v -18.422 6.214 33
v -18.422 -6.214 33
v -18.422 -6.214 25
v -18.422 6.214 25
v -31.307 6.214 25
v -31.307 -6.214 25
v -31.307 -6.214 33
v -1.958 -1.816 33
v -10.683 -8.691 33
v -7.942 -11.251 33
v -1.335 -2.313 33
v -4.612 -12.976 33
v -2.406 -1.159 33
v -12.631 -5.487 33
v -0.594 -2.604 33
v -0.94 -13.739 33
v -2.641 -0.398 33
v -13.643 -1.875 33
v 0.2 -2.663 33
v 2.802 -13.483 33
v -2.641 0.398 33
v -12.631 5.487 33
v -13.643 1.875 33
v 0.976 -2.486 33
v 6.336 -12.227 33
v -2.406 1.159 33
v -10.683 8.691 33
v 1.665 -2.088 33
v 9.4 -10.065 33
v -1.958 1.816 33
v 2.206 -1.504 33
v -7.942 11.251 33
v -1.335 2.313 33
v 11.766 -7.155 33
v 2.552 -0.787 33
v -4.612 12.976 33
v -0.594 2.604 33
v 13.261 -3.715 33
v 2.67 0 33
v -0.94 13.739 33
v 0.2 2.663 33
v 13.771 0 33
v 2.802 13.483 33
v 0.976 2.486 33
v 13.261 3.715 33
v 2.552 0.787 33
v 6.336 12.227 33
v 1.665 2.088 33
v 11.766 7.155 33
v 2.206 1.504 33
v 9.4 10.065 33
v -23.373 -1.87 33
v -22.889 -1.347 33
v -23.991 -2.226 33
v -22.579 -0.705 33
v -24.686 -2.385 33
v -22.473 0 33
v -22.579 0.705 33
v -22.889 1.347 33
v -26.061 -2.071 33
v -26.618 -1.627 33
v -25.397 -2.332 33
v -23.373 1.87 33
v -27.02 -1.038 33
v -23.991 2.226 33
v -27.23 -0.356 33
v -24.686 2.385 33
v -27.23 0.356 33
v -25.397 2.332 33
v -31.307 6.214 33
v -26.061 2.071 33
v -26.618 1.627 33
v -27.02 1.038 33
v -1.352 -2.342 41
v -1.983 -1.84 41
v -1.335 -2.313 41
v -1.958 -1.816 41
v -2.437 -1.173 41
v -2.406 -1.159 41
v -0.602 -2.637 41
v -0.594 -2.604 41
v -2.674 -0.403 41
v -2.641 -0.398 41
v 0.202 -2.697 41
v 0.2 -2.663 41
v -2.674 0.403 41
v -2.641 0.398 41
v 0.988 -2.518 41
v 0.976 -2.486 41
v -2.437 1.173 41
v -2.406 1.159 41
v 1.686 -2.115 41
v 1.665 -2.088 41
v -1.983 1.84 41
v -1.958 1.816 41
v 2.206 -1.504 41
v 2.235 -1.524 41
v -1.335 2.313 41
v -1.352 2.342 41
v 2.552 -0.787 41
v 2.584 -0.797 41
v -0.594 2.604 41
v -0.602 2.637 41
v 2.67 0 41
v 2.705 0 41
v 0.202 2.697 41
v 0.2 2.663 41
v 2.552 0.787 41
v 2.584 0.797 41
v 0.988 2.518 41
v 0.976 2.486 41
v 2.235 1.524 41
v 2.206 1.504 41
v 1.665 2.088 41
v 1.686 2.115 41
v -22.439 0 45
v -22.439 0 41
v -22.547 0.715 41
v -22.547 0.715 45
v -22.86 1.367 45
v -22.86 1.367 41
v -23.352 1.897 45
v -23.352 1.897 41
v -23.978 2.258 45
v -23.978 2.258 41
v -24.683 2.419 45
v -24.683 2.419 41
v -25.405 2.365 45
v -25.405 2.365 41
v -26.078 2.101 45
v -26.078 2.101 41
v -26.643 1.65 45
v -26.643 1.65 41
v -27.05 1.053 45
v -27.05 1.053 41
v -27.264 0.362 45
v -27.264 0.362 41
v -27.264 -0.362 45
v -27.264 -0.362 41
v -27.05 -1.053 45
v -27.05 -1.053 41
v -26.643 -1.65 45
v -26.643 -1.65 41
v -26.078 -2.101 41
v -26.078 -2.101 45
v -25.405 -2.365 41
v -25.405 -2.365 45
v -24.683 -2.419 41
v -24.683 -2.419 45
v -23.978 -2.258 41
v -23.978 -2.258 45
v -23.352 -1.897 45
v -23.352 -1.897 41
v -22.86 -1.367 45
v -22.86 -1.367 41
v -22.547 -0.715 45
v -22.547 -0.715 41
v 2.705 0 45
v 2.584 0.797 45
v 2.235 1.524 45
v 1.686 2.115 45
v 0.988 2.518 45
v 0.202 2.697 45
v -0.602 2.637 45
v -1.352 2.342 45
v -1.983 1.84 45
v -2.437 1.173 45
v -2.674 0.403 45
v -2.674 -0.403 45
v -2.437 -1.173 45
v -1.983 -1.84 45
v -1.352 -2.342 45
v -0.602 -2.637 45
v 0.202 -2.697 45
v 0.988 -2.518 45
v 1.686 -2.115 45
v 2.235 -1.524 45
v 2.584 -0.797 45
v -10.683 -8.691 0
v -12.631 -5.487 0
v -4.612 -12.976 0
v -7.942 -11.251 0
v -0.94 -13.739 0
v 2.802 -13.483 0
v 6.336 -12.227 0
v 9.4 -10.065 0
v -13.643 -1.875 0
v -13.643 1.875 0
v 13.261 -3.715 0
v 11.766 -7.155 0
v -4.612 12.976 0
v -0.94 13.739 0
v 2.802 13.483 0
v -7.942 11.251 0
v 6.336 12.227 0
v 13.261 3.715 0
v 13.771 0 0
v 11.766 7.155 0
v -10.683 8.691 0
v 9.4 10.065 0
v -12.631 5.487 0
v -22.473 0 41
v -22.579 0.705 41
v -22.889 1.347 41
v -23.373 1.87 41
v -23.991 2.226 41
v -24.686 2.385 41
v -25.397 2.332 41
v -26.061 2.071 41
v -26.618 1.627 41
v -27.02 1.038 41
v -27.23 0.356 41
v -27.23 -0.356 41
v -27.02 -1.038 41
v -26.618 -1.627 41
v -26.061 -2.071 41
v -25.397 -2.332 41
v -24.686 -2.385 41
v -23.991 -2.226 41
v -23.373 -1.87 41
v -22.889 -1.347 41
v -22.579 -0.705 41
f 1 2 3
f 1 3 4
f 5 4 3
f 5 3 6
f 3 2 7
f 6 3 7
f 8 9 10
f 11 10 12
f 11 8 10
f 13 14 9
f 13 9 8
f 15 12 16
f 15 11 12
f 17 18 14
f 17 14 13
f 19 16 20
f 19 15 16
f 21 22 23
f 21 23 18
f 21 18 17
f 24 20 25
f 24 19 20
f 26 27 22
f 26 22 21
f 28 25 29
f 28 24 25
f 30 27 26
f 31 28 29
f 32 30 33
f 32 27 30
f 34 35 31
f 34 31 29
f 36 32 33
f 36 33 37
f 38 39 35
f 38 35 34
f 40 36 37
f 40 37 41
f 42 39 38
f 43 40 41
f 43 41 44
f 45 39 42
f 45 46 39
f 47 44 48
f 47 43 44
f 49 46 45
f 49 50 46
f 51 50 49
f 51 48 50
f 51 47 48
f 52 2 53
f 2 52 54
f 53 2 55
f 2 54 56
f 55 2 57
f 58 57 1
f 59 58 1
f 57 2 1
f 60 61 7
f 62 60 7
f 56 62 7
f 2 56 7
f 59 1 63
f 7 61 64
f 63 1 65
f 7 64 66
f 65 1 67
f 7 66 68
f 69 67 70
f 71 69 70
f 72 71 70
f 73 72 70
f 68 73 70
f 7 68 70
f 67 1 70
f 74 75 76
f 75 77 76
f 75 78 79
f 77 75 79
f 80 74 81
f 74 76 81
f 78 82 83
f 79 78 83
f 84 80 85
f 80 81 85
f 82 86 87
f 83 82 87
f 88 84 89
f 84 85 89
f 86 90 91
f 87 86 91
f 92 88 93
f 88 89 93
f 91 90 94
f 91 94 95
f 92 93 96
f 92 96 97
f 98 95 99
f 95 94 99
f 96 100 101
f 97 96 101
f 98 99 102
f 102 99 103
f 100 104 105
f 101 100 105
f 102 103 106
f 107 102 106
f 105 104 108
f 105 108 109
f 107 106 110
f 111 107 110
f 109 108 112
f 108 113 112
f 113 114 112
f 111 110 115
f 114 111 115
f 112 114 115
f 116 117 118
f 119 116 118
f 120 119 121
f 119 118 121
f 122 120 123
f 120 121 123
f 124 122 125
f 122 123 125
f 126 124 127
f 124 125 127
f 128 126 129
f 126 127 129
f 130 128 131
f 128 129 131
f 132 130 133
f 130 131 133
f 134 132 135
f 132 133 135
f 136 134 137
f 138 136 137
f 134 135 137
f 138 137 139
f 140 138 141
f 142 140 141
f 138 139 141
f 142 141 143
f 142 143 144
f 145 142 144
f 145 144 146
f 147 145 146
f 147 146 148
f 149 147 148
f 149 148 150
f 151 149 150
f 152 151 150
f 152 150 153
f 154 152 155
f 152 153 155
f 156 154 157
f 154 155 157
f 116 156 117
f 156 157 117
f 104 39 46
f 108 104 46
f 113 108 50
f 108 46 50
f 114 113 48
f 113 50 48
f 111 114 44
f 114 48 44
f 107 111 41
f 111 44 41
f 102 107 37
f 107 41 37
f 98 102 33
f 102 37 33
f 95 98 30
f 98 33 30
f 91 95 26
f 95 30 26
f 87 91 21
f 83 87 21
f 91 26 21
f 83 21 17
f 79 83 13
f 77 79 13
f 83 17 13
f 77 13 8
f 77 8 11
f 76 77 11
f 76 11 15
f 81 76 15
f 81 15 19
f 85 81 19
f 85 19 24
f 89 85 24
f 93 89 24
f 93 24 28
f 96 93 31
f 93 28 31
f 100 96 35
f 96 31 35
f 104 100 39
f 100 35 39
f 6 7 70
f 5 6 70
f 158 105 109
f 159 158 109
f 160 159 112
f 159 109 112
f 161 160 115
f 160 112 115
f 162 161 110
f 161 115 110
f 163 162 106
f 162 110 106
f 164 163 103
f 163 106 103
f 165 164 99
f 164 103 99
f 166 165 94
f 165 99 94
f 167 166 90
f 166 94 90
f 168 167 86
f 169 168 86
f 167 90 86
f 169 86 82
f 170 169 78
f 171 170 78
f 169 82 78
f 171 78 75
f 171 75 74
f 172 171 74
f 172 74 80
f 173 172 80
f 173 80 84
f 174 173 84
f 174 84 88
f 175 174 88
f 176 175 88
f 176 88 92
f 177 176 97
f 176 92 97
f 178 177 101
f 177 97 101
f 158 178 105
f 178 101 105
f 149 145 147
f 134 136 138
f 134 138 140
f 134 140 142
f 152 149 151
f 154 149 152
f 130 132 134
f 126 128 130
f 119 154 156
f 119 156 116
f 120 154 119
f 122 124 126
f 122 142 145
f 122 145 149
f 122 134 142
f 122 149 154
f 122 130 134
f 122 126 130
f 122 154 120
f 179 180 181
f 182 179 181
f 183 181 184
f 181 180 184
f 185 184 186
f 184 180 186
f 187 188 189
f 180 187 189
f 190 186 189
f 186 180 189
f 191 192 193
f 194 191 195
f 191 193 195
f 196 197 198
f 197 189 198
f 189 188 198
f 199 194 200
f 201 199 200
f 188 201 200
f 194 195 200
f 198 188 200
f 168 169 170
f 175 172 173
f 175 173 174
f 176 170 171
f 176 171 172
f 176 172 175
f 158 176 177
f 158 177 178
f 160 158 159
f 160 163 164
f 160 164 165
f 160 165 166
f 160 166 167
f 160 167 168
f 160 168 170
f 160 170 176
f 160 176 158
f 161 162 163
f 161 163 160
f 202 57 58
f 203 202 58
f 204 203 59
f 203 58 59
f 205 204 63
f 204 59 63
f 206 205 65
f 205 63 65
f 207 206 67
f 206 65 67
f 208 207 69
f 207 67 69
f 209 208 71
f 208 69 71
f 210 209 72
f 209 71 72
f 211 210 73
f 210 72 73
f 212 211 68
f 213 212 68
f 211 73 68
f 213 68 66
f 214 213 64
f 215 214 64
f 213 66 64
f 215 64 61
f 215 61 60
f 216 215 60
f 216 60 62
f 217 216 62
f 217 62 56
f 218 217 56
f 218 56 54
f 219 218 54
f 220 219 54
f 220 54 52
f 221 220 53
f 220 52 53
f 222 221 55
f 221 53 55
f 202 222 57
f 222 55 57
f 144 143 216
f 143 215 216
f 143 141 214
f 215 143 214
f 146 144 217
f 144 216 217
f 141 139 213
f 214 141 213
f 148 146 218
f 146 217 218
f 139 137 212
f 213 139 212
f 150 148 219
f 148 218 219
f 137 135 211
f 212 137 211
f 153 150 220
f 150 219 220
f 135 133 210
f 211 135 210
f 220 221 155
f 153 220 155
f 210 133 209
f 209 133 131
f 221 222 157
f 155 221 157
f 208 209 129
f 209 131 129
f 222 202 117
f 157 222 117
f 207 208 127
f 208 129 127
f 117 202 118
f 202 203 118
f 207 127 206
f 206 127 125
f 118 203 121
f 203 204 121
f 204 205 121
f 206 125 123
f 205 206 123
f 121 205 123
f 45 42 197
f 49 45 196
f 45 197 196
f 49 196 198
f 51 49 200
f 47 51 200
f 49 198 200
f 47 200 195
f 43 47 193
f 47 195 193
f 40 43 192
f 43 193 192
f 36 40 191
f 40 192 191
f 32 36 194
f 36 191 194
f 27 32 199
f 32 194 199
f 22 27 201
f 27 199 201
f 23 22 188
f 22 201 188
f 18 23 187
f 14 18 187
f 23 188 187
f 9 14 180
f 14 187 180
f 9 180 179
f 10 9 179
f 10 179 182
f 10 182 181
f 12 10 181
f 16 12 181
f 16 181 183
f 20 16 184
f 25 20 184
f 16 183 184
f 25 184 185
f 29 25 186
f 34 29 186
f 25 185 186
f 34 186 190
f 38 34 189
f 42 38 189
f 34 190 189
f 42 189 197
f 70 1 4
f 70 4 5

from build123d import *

# Parameters (mm, degrees)
SKETCH2_R           = 13.771311666
BOSS_EXTRUDE1_DEPTH = 33
SKETCH4_R           = 2.670460619
BOSS_EXTRUDE2_DEPTH = 8
SKETCH5_R           = 2.391755936
BOSS_EXTRUDE3_DEPTH = 8
SKETCH6_W           = 12.884717539
SKETCH6_H           = 12.427625198
BOSS_EXTRUDE4_DEPTH = 8
SKETCH23_R          = 2.425954538
BOSS_EXTRUDE6_DEPTH = 4
SKETCH24_R          = 2.7046062
BOSS_EXTRUDE7_DEPTH = 4


with BuildPart() as part:
    # Sketch2 → Boss-Extrude1 (new body)
    with BuildSketch(Plane.XY):
        Circle(SKETCH2_R)
    extrude(amount=BOSS_EXTRUDE1_DEPTH)

    # Sketch4 → Boss-Extrude2 (add)
    with BuildSketch(Plane.XY.offset(33)):
        Circle(SKETCH4_R)
    extrude(amount=BOSS_EXTRUDE2_DEPTH)

    # Sketch24 → Boss-Extrude7 (add)
    with BuildSketch(Plane.XY.offset(41)):
        Circle(SKETCH24_R)
    extrude(amount=BOSS_EXTRUDE7_DEPTH)


with BuildPart() as body_2:
    # Sketch5 → Boss-Extrude3 (new body)
    with BuildSketch(Plane.XY.offset(33)):
        with Locations((-24.864724485, 0)):
            Circle(SKETCH5_R)
    extrude(amount=BOSS_EXTRUDE3_DEPTH)

    # Sketch6 → Boss-Extrude4 (add)
    with BuildSketch(Plane(origin=(0, 0, 33), x_dir=(-1, 0, 0), z_dir=(0, 0, -1))):
        with Locations((24.864724486, 0)):
            Rectangle(SKETCH6_W, SKETCH6_H)
    extrude(amount=BOSS_EXTRUDE4_DEPTH)

    # Sketch23 → Boss-Extrude6 (add)
    with BuildSketch(Plane.XY.offset(41)):
        with Locations((-24.864724485, 0)):
            Circle(SKETCH23_R)
    extrude(amount=BOSS_EXTRUDE6_DEPTH)


solid = Compound([part.part, body_2.part])
